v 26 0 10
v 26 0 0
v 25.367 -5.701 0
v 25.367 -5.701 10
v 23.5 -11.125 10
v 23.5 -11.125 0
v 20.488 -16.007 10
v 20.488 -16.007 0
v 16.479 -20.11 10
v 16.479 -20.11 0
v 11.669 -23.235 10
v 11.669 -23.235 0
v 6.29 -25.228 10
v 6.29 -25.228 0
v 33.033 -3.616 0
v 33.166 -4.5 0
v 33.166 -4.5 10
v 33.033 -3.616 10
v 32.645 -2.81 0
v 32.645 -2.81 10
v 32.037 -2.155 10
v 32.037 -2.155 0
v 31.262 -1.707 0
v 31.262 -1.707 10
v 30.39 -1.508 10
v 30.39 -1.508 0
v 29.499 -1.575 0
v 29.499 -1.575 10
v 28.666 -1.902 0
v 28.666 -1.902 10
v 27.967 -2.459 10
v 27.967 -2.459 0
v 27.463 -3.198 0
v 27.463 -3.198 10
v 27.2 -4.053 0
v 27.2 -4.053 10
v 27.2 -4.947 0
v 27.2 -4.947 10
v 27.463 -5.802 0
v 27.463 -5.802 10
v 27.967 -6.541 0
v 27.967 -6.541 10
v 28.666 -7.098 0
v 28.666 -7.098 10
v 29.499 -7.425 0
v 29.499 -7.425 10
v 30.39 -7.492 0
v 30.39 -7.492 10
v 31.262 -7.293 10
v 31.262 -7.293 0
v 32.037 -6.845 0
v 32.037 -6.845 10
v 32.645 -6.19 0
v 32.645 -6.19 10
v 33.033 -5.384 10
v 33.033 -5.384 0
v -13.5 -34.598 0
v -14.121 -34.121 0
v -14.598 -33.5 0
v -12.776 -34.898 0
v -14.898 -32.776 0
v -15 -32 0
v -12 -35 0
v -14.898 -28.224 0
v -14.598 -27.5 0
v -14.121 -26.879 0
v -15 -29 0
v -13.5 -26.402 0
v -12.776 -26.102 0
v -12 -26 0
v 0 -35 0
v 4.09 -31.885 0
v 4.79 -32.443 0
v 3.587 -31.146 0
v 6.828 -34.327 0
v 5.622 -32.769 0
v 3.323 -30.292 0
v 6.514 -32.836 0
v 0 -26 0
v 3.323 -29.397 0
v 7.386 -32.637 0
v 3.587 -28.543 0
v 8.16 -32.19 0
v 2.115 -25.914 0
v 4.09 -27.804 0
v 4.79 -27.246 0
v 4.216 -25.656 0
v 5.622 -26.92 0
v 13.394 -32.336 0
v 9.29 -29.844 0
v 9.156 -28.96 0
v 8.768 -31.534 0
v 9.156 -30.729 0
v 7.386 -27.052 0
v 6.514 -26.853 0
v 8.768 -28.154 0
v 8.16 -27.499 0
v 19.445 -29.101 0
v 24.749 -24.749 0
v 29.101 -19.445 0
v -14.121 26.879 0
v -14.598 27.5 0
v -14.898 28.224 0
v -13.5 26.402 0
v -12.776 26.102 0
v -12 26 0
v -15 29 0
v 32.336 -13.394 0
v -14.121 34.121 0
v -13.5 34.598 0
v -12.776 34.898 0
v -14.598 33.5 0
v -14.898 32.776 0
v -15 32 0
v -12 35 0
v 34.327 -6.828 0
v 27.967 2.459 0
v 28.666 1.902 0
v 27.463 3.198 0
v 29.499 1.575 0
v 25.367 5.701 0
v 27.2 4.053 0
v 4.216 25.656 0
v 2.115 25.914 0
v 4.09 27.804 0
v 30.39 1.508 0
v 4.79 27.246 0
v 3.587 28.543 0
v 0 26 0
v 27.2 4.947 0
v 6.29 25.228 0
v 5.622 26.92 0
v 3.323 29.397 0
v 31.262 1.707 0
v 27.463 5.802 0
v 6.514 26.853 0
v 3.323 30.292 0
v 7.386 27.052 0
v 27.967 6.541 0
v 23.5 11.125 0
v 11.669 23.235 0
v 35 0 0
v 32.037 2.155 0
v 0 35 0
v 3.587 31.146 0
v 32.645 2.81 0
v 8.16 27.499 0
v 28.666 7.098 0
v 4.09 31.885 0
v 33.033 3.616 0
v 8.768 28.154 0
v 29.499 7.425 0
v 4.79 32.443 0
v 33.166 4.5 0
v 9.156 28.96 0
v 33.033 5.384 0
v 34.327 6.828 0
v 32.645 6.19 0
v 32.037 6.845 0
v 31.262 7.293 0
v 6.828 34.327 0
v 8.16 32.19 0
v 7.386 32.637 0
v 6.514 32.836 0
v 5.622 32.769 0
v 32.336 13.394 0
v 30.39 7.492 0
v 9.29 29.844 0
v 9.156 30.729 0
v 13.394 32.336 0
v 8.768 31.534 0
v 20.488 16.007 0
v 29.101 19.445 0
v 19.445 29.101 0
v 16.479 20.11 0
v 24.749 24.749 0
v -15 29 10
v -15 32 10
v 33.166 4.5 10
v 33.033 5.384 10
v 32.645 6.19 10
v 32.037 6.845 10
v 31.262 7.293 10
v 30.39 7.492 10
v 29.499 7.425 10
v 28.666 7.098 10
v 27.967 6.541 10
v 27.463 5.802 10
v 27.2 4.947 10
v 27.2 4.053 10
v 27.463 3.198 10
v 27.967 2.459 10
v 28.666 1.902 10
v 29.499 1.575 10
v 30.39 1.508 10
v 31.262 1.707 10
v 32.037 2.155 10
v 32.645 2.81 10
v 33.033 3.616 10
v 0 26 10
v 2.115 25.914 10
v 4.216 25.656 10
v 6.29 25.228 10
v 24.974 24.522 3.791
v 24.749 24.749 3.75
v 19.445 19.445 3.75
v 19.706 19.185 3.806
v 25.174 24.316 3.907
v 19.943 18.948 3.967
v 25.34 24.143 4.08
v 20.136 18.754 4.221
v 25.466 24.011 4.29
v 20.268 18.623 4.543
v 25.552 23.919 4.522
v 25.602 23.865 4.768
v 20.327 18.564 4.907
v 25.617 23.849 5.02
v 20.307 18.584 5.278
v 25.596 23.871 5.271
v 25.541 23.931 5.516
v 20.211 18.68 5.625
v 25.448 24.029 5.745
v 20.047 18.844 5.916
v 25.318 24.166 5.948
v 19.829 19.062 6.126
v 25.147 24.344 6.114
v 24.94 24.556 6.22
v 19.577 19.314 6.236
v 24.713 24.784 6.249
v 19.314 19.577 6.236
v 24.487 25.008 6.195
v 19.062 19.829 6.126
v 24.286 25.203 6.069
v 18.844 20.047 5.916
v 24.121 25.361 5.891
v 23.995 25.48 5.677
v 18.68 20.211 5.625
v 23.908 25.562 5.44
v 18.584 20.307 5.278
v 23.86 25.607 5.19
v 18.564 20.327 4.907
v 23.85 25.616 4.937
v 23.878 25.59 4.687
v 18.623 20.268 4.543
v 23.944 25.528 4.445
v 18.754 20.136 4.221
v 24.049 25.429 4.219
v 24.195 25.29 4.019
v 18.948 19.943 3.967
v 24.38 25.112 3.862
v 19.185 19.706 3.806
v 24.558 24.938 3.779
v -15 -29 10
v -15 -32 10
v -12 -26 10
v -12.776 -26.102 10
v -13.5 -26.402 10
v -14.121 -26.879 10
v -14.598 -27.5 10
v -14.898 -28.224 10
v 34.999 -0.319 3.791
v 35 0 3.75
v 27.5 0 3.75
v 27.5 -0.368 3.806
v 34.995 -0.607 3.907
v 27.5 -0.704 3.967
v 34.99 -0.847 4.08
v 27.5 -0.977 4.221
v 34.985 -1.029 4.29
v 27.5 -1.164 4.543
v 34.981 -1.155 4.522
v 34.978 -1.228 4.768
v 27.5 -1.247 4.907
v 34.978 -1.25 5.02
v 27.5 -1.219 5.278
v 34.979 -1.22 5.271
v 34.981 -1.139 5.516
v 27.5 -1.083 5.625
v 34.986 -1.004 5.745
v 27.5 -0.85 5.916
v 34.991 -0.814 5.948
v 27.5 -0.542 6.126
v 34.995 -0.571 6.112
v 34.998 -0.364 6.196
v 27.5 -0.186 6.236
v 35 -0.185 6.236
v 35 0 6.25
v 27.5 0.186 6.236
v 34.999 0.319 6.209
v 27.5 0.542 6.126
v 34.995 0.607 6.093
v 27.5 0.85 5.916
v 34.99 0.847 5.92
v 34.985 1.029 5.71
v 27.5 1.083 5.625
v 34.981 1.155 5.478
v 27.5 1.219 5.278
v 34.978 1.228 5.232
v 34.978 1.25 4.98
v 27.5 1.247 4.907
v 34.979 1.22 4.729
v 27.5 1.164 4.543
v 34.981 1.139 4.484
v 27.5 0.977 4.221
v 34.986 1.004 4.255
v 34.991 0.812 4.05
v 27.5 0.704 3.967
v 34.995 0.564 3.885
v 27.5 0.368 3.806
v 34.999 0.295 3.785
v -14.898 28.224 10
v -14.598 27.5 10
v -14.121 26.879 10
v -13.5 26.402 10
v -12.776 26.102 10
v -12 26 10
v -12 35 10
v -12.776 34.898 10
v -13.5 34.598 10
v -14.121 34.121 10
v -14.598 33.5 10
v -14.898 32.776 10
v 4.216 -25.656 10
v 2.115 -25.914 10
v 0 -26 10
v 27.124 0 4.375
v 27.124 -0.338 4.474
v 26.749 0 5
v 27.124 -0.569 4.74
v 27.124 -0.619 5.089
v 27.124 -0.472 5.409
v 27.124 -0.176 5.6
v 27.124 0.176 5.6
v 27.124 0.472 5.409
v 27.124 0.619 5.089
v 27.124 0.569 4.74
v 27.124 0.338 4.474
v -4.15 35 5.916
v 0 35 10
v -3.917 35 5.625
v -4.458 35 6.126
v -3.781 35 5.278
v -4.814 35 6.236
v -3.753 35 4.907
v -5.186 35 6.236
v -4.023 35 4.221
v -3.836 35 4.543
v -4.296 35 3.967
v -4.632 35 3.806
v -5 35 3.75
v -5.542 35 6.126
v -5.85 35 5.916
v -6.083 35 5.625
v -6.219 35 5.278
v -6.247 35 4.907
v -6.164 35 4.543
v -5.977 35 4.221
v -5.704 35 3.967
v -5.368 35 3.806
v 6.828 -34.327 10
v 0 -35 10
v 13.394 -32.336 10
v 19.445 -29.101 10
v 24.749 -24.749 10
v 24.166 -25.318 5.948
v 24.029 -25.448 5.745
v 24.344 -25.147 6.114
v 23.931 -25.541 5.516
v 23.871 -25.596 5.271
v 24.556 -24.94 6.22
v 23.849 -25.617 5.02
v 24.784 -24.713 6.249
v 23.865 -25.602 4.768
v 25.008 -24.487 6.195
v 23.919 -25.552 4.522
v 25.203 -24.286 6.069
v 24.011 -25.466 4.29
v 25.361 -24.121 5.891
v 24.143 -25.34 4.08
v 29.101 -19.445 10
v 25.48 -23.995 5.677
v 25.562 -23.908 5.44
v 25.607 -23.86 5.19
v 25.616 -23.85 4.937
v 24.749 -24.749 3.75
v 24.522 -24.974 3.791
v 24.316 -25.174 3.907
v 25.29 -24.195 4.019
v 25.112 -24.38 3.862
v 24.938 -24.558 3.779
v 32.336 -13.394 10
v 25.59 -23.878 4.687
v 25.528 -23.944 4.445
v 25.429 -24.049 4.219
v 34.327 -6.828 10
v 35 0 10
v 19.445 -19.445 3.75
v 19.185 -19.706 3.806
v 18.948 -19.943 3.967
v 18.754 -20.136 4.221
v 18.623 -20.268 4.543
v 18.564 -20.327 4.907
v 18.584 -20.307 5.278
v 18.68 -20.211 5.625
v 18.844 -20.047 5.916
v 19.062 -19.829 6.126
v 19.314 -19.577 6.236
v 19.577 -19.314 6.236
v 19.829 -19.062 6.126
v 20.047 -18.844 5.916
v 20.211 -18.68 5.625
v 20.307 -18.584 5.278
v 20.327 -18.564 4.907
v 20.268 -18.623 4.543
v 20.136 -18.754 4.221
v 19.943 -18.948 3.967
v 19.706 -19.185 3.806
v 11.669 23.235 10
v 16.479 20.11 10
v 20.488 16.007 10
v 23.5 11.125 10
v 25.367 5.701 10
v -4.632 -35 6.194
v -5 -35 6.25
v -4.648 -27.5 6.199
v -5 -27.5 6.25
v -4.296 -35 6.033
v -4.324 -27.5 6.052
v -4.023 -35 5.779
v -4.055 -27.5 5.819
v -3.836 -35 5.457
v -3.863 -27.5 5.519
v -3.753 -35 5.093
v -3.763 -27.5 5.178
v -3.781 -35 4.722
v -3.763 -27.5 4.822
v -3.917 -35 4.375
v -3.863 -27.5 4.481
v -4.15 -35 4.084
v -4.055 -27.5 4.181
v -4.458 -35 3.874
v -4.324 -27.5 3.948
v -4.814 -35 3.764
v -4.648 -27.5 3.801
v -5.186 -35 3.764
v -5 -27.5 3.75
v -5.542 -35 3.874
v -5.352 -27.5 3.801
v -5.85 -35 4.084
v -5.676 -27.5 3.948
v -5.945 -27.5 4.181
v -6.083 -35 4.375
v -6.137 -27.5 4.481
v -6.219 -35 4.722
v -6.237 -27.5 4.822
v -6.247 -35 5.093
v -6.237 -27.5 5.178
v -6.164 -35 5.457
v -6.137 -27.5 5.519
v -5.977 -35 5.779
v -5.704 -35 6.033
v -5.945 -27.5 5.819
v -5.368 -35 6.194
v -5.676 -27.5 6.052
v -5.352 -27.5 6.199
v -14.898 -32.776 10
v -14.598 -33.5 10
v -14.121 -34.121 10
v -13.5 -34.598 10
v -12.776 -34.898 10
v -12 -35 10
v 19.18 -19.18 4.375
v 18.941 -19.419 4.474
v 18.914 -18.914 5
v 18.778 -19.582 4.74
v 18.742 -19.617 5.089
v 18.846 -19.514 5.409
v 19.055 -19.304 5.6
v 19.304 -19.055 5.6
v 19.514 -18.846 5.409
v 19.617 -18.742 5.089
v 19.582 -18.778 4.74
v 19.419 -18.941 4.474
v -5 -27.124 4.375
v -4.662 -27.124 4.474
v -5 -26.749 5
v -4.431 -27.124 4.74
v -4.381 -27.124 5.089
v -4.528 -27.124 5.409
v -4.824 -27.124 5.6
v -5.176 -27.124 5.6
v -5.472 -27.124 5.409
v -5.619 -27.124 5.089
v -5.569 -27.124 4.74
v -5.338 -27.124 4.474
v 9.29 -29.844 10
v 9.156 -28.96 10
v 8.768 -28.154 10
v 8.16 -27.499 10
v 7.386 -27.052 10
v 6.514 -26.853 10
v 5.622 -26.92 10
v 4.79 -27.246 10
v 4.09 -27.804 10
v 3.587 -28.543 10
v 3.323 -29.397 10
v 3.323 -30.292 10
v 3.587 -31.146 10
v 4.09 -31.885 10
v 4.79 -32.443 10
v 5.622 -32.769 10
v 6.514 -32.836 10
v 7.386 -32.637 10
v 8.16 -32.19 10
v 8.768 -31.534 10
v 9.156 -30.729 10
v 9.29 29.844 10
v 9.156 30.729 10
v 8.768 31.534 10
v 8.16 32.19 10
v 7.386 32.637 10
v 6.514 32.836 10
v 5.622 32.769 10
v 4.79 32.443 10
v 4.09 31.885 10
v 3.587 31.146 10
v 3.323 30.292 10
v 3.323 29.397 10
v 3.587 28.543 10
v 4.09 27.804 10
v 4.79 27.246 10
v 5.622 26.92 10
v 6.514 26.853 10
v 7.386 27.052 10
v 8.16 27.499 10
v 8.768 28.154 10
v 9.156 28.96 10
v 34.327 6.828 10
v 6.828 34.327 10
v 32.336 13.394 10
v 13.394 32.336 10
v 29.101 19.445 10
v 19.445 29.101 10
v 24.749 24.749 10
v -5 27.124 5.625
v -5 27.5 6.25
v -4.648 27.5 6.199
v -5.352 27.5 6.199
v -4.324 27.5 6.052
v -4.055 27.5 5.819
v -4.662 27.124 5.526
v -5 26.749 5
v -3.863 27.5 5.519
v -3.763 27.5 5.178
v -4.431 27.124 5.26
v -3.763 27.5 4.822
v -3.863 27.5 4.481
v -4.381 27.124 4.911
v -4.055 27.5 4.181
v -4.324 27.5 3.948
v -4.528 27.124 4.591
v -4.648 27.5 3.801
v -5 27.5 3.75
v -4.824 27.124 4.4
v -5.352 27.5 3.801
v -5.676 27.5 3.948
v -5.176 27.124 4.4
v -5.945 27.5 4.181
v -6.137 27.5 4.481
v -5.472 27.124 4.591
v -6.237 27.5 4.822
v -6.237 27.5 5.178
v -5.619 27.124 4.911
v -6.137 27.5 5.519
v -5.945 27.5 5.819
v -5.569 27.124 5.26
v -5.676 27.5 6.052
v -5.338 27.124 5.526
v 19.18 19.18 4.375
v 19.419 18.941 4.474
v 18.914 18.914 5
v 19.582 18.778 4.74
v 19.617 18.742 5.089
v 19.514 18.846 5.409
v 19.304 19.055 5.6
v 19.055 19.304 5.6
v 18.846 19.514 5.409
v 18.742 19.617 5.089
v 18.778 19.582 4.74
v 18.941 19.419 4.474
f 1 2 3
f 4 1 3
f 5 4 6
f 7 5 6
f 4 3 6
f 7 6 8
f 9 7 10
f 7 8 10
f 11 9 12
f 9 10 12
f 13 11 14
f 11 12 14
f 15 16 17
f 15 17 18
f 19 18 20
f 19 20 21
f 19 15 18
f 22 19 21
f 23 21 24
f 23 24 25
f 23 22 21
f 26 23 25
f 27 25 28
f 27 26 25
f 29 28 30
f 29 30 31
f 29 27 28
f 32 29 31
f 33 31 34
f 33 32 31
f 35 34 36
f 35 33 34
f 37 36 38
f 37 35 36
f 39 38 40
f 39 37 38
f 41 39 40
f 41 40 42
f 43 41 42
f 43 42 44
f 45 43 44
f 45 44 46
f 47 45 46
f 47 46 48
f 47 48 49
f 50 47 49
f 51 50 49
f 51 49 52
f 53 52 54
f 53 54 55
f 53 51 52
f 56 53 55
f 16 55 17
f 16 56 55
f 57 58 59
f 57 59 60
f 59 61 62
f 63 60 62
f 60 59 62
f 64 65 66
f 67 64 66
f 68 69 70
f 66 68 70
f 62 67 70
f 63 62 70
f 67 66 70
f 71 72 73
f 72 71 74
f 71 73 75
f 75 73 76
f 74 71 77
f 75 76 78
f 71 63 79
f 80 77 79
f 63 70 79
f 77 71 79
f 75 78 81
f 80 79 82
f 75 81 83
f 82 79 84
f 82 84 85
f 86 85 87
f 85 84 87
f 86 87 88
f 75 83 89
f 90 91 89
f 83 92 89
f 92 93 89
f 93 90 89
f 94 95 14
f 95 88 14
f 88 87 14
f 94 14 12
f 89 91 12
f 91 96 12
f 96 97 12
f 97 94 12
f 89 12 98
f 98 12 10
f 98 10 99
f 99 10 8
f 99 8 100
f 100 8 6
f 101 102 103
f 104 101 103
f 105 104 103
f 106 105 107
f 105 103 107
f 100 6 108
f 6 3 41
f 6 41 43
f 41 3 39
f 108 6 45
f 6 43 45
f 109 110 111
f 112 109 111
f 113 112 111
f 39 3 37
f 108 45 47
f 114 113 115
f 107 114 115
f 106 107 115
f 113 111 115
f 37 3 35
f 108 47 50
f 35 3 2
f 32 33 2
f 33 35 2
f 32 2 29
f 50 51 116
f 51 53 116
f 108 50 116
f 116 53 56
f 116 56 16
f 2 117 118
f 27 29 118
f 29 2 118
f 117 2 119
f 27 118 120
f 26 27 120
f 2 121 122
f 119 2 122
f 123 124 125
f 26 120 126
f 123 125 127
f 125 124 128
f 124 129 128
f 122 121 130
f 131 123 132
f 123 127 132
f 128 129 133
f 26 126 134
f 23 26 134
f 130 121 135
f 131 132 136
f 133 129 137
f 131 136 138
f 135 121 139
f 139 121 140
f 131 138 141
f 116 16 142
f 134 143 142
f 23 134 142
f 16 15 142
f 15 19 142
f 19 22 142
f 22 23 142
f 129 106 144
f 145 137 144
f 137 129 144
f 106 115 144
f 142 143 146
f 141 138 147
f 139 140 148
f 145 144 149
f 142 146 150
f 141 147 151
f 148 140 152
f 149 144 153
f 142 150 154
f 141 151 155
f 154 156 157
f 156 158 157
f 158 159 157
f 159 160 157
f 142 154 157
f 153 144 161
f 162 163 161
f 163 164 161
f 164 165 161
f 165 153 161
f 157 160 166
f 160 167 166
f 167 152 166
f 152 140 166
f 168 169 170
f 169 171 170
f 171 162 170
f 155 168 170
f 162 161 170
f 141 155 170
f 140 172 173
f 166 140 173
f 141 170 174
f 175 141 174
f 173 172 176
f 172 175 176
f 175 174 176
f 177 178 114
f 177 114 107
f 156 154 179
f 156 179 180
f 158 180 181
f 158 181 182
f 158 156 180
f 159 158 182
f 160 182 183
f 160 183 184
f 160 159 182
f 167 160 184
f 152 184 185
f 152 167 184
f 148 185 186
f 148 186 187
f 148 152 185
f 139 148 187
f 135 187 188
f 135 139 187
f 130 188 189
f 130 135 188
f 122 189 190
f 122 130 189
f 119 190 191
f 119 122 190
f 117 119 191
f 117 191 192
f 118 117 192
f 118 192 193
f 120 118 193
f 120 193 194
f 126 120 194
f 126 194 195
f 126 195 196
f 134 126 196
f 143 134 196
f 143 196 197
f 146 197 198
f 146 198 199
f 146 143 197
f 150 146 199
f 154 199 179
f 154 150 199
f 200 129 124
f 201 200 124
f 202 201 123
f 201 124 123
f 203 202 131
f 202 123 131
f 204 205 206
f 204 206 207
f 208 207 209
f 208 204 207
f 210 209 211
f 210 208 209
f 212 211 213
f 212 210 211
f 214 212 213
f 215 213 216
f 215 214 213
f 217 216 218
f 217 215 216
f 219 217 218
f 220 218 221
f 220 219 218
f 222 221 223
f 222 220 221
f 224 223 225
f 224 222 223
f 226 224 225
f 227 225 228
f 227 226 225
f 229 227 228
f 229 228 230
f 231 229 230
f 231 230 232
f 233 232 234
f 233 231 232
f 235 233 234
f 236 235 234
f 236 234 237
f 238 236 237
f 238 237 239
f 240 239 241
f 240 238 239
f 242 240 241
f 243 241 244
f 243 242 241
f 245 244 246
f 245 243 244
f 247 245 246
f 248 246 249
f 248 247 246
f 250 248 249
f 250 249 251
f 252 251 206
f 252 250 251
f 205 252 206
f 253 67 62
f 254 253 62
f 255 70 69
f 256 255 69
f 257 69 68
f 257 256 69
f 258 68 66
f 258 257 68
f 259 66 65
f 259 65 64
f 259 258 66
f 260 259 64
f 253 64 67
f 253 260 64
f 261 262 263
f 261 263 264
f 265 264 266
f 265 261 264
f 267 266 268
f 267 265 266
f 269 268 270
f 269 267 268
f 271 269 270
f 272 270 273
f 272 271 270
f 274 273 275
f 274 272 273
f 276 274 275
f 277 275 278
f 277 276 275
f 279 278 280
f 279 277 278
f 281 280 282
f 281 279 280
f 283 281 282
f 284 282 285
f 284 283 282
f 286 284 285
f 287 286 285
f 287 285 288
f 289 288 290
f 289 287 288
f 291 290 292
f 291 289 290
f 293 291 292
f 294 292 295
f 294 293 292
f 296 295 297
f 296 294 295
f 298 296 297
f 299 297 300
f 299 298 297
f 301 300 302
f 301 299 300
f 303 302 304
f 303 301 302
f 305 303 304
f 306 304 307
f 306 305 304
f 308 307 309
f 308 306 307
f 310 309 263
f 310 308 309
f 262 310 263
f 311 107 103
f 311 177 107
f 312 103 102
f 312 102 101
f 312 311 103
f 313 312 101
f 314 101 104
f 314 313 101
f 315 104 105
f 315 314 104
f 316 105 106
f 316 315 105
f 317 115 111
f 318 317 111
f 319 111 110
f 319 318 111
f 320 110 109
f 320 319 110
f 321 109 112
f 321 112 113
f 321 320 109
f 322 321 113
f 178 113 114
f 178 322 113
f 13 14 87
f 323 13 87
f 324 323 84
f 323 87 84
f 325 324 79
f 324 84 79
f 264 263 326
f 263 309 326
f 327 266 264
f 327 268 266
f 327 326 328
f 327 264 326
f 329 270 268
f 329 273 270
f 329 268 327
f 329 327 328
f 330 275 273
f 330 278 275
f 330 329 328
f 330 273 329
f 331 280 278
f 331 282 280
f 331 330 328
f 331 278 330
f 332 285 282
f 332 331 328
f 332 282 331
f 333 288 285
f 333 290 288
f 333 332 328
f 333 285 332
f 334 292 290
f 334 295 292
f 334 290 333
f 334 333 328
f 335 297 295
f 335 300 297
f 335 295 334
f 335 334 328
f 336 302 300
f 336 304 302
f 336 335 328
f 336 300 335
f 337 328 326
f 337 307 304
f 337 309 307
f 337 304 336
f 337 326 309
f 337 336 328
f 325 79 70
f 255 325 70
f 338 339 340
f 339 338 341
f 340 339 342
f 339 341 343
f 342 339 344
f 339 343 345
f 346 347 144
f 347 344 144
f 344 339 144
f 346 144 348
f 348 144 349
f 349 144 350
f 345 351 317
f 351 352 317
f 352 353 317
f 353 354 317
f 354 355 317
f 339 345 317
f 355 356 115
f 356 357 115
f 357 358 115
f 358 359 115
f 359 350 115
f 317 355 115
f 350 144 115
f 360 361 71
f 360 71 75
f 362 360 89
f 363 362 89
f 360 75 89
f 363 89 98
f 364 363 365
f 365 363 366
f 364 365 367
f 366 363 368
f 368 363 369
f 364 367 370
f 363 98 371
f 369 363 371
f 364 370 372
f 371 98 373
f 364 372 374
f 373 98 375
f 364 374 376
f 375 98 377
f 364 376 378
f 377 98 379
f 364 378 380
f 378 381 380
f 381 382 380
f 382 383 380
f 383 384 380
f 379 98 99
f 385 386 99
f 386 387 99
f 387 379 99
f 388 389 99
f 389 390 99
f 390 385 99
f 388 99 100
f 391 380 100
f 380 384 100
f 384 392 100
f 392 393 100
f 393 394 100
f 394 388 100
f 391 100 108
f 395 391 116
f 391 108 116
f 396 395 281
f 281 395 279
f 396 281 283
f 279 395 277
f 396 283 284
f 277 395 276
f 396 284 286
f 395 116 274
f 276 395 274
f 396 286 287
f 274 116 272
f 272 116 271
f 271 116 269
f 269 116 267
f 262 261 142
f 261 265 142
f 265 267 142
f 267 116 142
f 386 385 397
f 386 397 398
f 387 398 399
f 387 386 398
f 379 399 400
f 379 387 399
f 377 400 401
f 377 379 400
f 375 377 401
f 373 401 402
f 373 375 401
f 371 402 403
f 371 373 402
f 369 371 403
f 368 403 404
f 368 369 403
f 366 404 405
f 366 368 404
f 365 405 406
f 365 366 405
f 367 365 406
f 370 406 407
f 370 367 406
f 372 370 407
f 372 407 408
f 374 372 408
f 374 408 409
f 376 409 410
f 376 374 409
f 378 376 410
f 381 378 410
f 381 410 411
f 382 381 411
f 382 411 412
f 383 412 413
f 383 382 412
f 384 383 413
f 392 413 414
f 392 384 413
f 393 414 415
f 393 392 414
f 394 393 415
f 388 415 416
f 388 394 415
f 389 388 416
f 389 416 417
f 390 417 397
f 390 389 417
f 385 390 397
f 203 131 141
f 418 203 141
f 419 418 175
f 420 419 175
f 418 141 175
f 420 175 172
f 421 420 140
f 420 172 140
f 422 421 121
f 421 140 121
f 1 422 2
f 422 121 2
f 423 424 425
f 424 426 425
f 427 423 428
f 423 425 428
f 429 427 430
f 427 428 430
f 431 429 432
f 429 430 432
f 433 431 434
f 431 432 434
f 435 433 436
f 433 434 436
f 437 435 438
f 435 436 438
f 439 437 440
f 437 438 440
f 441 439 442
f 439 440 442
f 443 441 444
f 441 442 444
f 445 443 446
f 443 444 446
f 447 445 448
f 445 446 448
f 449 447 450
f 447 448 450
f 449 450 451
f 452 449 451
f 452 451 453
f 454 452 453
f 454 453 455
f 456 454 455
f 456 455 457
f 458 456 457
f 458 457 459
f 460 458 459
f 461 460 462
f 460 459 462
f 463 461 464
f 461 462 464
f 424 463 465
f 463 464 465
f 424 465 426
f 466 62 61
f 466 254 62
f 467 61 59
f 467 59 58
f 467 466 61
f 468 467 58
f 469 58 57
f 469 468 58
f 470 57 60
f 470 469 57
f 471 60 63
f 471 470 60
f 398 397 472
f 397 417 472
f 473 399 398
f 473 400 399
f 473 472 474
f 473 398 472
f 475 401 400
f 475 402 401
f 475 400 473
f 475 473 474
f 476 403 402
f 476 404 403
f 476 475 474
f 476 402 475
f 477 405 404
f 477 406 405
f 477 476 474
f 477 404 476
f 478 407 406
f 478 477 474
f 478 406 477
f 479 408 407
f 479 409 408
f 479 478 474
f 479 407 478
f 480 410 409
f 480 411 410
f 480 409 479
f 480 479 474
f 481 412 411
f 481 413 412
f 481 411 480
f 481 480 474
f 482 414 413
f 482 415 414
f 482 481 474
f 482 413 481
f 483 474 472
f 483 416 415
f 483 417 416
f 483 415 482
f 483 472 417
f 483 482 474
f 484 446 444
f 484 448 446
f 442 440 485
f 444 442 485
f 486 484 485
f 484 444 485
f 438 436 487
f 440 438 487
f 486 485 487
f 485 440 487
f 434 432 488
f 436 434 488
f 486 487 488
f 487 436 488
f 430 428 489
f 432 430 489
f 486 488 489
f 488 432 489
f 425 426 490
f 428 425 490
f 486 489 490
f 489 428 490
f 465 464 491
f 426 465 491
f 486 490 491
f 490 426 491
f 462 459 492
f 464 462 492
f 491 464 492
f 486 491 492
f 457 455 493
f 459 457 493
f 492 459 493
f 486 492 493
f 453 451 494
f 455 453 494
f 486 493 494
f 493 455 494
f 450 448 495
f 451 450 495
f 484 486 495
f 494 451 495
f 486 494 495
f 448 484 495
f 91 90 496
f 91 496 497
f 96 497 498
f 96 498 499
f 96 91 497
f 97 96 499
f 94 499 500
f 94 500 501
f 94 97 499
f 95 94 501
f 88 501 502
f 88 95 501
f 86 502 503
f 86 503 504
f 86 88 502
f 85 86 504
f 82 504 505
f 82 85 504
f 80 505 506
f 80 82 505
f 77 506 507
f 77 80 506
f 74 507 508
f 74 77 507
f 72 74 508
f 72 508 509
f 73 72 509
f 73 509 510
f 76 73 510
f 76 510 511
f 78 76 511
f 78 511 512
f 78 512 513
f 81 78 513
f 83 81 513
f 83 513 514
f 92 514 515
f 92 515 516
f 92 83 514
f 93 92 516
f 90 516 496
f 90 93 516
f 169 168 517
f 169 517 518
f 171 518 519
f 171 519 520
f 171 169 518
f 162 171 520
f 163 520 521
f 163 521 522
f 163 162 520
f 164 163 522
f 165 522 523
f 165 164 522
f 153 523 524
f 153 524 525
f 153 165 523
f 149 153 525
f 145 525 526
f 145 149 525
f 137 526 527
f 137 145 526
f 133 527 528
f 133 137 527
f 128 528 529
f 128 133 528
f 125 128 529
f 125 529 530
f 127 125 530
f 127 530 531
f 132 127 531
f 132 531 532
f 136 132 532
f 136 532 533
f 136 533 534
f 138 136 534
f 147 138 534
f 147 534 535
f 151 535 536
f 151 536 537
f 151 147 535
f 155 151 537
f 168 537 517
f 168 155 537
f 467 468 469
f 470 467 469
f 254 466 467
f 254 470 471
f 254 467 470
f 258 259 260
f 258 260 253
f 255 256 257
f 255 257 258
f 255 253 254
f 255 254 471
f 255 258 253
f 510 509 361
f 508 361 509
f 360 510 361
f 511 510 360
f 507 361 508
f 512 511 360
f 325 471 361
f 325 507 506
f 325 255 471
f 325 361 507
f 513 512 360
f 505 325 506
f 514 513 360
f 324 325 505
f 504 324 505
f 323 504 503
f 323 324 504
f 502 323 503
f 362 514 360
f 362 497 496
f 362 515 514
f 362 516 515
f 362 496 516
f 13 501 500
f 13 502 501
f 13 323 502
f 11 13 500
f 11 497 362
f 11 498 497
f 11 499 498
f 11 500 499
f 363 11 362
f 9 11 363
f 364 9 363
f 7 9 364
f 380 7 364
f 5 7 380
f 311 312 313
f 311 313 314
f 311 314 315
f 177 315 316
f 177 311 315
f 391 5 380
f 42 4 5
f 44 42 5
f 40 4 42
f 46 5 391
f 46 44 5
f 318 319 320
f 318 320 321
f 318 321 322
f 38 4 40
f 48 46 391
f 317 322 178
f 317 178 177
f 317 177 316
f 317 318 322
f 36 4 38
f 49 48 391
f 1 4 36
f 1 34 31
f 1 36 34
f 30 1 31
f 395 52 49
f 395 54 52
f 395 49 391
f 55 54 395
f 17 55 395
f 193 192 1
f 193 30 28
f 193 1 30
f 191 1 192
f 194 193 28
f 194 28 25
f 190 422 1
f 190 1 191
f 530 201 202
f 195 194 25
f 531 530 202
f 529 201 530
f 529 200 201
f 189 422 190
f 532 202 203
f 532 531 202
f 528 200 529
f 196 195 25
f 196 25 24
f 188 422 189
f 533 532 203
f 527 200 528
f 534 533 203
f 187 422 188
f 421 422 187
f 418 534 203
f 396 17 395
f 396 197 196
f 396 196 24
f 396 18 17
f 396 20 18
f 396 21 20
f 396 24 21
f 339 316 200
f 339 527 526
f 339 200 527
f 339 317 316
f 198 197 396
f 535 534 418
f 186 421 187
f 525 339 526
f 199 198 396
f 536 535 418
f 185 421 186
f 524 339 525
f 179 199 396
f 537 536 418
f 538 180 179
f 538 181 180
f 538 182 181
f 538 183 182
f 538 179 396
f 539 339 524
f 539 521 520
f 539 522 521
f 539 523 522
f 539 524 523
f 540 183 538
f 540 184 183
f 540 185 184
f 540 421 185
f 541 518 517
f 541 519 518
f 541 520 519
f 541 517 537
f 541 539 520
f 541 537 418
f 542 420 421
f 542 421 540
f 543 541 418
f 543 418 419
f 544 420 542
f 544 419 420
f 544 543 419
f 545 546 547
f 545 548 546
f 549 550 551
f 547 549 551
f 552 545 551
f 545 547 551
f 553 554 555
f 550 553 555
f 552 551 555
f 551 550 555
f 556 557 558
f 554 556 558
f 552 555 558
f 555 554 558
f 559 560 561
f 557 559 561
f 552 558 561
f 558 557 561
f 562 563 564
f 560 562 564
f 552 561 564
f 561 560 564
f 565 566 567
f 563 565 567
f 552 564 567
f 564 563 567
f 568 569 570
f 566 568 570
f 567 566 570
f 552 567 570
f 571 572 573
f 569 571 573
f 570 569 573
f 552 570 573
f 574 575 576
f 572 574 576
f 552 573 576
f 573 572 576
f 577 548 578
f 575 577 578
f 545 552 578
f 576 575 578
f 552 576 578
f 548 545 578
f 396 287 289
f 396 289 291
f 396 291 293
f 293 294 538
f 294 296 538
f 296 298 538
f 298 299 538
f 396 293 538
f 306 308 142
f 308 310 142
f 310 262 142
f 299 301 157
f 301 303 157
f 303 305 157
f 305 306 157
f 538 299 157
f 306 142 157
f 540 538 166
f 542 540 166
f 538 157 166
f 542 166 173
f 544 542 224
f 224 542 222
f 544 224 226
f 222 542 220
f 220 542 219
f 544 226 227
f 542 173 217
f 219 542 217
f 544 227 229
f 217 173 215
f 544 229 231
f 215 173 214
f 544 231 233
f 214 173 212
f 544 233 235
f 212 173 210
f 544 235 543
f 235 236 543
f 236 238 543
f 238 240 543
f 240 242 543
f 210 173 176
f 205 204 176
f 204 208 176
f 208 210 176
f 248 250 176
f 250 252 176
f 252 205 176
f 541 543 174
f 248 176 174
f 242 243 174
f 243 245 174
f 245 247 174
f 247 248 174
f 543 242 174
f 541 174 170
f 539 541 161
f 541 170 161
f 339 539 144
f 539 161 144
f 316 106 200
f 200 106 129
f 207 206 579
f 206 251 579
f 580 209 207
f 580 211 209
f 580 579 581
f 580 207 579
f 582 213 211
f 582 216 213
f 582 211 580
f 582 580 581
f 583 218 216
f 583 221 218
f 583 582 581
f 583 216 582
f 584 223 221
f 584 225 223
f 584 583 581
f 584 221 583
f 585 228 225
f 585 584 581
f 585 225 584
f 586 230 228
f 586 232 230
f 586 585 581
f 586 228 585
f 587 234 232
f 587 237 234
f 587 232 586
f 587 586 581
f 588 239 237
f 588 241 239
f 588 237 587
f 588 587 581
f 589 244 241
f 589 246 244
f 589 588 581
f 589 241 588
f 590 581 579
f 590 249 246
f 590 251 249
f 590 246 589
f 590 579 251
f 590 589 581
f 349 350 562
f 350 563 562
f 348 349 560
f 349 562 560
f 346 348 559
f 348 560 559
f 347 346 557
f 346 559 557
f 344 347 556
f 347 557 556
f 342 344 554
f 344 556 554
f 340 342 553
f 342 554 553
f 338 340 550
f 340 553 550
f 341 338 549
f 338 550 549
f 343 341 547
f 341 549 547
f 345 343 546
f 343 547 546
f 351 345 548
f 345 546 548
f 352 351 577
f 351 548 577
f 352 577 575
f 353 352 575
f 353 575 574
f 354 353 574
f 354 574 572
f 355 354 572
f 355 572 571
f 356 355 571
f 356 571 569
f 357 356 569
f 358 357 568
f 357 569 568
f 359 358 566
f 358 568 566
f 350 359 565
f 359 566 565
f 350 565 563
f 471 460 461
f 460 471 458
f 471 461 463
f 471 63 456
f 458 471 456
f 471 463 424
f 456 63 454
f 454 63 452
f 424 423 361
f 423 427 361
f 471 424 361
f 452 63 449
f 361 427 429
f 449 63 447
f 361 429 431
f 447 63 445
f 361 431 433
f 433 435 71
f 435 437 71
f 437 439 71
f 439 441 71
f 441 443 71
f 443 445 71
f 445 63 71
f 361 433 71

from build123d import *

# Parameters (mm, degrees)
SKETCH1_R                       = 3
BOSS_EXTRUDE1_DEPTH             = 10
FILLET1_R                       = 3
CIRPATTERN1_COUNT               = 2
CIRPATTERN1_ANGLE               = 45
CIRPATTERN2_COUNT               = 2
CIRPATTERN2_ANGLE               = 45
M3_TAPPED_HOLE4_D               = 2.5
M3_TAPPED_HOLE4_DEPTH           = 7.5
M3_TAPPED_HOLE4_TIP             = 0.751075774
M3_TAPPED_HOLE4_ON_FACE_2_D     = 2.5
M3_TAPPED_HOLE4_ON_FACE_2_DEPTH = 7.5
M3_TAPPED_HOLE4_ON_FACE_2_TIP   = 0.751075774


with BuildPart() as part:
    # Sketch1 → Boss-Extrude1 (new body)
    with BuildSketch(Plane.XY):
        with BuildLine():
            ThreePointArc((35, 0), (24.748737342, 24.748737342), (0, 35))
            ThreePointArc((0, 35), (-7.687744108, 34.145257219), (-15, 31.622776602))
            Line((-15, 31.622776602), (-15, 26))
            Line((-15, 26), (0, 26))
            ThreePointArc((0, 26), (3.168421474, 25.806222222), (6.289614512, 25.227777335))
            ThreePointArc((6.289614512, 25.227777335), (20.48816704, 16.00734242), (26, 0))
            ThreePointArc((26, 0), (20.48816704, -16.00734242), (6.289614512, -25.227777335))
            ThreePointArc((6.289614512, -25.227777335), (3.168421474, -25.806222222), (0, -26))
            Line((0, -26), (-15, -26))
            Line((-15, -26), (-15, -31.622776602))
            ThreePointArc((-15, -31.622776602), (-7.687744108, -34.145257219), (0, -35))
            ThreePointArc((0, -35), (24.748737342, -24.748737342), (35, 0))
        make_face()
        with Locations((6.289614512, -29.844442519)):
            Circle(SKETCH1_R, mode=Mode.SUBTRACT)
        with Locations((30.166206258, -4.5)):
            Circle(SKETCH1_R, mode=Mode.SUBTRACT)
        with Locations((30.166206258, 4.5)):
            Circle(SKETCH1_R, mode=Mode.SUBTRACT)
        with Locations((6.289614512, 29.844442519)):
            Circle(SKETCH1_R, mode=Mode.SUBTRACT)
        with BuildLine():
            ThreePointArc((-15, 31.622776602), (-7.687744108, 34.145257219), (0, 35))
            Line((0, 35), (-15, 35))
            Line((-15, 35), (-15, 31.622776602))
        make_face()
        with BuildLine():
            Line((-15, -35), (0, -35))
            ThreePointArc((0, -35), (-7.687744108, -34.145257219), (-15, -31.622776602))
            Line((-15, -31.622776602), (-15, -35))
        make_face()
    extrude(amount=BOSS_EXTRUDE1_DEPTH)

    # Fillet1
    fillet1_edges = [part.edges().sort_by_distance(p)[0] for p in [
        (-15, 26, 5),
        (-15, 35, 5),
        (-15, -35, 5),
        (-15, -26, 5),
    ]]
    fillet(fillet1_edges, radius=FILLET1_R)

    # Sketch14 → M3 Tapped Hole3 (revolve, cut)
    with BuildSketch(Plane(origin=(35, 0, 5), x_dir=(0, 0, -1), z_dir=(0, 1, 0))):
        Polygon((0, 0), (0, 8.251075774), (1.25, 7.5), (1.25, 0), align=None)
    m3_tapped_hole3 = revolve(axis=Axis((41.35, 0, 5), (-1, 0, 0)), mode=Mode.SUBTRACT)

    # CirPattern1: M3 Tapped Hole3 ×2 about axis
    cirpattern1_axis = Axis((0, 0, 0), (0, 0, 1))
    for i in range(1, CIRPATTERN1_COUNT):
        add(m3_tapped_hole3.rotate(cirpattern1_axis, i * CIRPATTERN1_ANGLE / (CIRPATTERN1_COUNT - 1)), mode=Mode.SUBTRACT)

    # CirPattern2: M3 Tapped Hole3 ×2 about axis
    cirpattern2_axis = Axis((0, 0, 10), (0, 0, -1))
    for i in range(1, CIRPATTERN2_COUNT):
        add(m3_tapped_hole3.rotate(cirpattern2_axis, i * CIRPATTERN2_ANGLE / (CIRPATTERN2_COUNT - 1)), mode=Mode.SUBTRACT)

    # M3 Tapped Hole4
    with Locations(Plane(origin=(-5, -35, 5), x_dir=(0, 0, -1), z_dir=(0, -1, 0))):
        with Locations((0, 0)):
            Hole(M3_TAPPED_HOLE4_D / 2, depth=M3_TAPPED_HOLE4_DEPTH)
            with Locations((0, 0, -(M3_TAPPED_HOLE4_DEPTH + M3_TAPPED_HOLE4_TIP / 2))):  # 118° drill point
                Cone(0, M3_TAPPED_HOLE4_D / 2, M3_TAPPED_HOLE4_TIP, mode=Mode.SUBTRACT)

    # M3 Tapped Hole4 on face 2
    with Locations(Plane(origin=(-5, 35, 5), x_dir=(0, 0, 1), z_dir=(0, 1, 0))):
        with Locations((0, 0)):
            Hole(M3_TAPPED_HOLE4_ON_FACE_2_D / 2, depth=M3_TAPPED_HOLE4_ON_FACE_2_DEPTH)
            with Locations((0, 0, -(M3_TAPPED_HOLE4_ON_FACE_2_DEPTH + M3_TAPPED_HOLE4_ON_FACE_2_TIP / 2))):  # 118° drill point
                Cone(0, M3_TAPPED_HOLE4_ON_FACE_2_D / 2, M3_TAPPED_HOLE4_ON_FACE_2_TIP, mode=Mode.SUBTRACT)


solid = part.part
